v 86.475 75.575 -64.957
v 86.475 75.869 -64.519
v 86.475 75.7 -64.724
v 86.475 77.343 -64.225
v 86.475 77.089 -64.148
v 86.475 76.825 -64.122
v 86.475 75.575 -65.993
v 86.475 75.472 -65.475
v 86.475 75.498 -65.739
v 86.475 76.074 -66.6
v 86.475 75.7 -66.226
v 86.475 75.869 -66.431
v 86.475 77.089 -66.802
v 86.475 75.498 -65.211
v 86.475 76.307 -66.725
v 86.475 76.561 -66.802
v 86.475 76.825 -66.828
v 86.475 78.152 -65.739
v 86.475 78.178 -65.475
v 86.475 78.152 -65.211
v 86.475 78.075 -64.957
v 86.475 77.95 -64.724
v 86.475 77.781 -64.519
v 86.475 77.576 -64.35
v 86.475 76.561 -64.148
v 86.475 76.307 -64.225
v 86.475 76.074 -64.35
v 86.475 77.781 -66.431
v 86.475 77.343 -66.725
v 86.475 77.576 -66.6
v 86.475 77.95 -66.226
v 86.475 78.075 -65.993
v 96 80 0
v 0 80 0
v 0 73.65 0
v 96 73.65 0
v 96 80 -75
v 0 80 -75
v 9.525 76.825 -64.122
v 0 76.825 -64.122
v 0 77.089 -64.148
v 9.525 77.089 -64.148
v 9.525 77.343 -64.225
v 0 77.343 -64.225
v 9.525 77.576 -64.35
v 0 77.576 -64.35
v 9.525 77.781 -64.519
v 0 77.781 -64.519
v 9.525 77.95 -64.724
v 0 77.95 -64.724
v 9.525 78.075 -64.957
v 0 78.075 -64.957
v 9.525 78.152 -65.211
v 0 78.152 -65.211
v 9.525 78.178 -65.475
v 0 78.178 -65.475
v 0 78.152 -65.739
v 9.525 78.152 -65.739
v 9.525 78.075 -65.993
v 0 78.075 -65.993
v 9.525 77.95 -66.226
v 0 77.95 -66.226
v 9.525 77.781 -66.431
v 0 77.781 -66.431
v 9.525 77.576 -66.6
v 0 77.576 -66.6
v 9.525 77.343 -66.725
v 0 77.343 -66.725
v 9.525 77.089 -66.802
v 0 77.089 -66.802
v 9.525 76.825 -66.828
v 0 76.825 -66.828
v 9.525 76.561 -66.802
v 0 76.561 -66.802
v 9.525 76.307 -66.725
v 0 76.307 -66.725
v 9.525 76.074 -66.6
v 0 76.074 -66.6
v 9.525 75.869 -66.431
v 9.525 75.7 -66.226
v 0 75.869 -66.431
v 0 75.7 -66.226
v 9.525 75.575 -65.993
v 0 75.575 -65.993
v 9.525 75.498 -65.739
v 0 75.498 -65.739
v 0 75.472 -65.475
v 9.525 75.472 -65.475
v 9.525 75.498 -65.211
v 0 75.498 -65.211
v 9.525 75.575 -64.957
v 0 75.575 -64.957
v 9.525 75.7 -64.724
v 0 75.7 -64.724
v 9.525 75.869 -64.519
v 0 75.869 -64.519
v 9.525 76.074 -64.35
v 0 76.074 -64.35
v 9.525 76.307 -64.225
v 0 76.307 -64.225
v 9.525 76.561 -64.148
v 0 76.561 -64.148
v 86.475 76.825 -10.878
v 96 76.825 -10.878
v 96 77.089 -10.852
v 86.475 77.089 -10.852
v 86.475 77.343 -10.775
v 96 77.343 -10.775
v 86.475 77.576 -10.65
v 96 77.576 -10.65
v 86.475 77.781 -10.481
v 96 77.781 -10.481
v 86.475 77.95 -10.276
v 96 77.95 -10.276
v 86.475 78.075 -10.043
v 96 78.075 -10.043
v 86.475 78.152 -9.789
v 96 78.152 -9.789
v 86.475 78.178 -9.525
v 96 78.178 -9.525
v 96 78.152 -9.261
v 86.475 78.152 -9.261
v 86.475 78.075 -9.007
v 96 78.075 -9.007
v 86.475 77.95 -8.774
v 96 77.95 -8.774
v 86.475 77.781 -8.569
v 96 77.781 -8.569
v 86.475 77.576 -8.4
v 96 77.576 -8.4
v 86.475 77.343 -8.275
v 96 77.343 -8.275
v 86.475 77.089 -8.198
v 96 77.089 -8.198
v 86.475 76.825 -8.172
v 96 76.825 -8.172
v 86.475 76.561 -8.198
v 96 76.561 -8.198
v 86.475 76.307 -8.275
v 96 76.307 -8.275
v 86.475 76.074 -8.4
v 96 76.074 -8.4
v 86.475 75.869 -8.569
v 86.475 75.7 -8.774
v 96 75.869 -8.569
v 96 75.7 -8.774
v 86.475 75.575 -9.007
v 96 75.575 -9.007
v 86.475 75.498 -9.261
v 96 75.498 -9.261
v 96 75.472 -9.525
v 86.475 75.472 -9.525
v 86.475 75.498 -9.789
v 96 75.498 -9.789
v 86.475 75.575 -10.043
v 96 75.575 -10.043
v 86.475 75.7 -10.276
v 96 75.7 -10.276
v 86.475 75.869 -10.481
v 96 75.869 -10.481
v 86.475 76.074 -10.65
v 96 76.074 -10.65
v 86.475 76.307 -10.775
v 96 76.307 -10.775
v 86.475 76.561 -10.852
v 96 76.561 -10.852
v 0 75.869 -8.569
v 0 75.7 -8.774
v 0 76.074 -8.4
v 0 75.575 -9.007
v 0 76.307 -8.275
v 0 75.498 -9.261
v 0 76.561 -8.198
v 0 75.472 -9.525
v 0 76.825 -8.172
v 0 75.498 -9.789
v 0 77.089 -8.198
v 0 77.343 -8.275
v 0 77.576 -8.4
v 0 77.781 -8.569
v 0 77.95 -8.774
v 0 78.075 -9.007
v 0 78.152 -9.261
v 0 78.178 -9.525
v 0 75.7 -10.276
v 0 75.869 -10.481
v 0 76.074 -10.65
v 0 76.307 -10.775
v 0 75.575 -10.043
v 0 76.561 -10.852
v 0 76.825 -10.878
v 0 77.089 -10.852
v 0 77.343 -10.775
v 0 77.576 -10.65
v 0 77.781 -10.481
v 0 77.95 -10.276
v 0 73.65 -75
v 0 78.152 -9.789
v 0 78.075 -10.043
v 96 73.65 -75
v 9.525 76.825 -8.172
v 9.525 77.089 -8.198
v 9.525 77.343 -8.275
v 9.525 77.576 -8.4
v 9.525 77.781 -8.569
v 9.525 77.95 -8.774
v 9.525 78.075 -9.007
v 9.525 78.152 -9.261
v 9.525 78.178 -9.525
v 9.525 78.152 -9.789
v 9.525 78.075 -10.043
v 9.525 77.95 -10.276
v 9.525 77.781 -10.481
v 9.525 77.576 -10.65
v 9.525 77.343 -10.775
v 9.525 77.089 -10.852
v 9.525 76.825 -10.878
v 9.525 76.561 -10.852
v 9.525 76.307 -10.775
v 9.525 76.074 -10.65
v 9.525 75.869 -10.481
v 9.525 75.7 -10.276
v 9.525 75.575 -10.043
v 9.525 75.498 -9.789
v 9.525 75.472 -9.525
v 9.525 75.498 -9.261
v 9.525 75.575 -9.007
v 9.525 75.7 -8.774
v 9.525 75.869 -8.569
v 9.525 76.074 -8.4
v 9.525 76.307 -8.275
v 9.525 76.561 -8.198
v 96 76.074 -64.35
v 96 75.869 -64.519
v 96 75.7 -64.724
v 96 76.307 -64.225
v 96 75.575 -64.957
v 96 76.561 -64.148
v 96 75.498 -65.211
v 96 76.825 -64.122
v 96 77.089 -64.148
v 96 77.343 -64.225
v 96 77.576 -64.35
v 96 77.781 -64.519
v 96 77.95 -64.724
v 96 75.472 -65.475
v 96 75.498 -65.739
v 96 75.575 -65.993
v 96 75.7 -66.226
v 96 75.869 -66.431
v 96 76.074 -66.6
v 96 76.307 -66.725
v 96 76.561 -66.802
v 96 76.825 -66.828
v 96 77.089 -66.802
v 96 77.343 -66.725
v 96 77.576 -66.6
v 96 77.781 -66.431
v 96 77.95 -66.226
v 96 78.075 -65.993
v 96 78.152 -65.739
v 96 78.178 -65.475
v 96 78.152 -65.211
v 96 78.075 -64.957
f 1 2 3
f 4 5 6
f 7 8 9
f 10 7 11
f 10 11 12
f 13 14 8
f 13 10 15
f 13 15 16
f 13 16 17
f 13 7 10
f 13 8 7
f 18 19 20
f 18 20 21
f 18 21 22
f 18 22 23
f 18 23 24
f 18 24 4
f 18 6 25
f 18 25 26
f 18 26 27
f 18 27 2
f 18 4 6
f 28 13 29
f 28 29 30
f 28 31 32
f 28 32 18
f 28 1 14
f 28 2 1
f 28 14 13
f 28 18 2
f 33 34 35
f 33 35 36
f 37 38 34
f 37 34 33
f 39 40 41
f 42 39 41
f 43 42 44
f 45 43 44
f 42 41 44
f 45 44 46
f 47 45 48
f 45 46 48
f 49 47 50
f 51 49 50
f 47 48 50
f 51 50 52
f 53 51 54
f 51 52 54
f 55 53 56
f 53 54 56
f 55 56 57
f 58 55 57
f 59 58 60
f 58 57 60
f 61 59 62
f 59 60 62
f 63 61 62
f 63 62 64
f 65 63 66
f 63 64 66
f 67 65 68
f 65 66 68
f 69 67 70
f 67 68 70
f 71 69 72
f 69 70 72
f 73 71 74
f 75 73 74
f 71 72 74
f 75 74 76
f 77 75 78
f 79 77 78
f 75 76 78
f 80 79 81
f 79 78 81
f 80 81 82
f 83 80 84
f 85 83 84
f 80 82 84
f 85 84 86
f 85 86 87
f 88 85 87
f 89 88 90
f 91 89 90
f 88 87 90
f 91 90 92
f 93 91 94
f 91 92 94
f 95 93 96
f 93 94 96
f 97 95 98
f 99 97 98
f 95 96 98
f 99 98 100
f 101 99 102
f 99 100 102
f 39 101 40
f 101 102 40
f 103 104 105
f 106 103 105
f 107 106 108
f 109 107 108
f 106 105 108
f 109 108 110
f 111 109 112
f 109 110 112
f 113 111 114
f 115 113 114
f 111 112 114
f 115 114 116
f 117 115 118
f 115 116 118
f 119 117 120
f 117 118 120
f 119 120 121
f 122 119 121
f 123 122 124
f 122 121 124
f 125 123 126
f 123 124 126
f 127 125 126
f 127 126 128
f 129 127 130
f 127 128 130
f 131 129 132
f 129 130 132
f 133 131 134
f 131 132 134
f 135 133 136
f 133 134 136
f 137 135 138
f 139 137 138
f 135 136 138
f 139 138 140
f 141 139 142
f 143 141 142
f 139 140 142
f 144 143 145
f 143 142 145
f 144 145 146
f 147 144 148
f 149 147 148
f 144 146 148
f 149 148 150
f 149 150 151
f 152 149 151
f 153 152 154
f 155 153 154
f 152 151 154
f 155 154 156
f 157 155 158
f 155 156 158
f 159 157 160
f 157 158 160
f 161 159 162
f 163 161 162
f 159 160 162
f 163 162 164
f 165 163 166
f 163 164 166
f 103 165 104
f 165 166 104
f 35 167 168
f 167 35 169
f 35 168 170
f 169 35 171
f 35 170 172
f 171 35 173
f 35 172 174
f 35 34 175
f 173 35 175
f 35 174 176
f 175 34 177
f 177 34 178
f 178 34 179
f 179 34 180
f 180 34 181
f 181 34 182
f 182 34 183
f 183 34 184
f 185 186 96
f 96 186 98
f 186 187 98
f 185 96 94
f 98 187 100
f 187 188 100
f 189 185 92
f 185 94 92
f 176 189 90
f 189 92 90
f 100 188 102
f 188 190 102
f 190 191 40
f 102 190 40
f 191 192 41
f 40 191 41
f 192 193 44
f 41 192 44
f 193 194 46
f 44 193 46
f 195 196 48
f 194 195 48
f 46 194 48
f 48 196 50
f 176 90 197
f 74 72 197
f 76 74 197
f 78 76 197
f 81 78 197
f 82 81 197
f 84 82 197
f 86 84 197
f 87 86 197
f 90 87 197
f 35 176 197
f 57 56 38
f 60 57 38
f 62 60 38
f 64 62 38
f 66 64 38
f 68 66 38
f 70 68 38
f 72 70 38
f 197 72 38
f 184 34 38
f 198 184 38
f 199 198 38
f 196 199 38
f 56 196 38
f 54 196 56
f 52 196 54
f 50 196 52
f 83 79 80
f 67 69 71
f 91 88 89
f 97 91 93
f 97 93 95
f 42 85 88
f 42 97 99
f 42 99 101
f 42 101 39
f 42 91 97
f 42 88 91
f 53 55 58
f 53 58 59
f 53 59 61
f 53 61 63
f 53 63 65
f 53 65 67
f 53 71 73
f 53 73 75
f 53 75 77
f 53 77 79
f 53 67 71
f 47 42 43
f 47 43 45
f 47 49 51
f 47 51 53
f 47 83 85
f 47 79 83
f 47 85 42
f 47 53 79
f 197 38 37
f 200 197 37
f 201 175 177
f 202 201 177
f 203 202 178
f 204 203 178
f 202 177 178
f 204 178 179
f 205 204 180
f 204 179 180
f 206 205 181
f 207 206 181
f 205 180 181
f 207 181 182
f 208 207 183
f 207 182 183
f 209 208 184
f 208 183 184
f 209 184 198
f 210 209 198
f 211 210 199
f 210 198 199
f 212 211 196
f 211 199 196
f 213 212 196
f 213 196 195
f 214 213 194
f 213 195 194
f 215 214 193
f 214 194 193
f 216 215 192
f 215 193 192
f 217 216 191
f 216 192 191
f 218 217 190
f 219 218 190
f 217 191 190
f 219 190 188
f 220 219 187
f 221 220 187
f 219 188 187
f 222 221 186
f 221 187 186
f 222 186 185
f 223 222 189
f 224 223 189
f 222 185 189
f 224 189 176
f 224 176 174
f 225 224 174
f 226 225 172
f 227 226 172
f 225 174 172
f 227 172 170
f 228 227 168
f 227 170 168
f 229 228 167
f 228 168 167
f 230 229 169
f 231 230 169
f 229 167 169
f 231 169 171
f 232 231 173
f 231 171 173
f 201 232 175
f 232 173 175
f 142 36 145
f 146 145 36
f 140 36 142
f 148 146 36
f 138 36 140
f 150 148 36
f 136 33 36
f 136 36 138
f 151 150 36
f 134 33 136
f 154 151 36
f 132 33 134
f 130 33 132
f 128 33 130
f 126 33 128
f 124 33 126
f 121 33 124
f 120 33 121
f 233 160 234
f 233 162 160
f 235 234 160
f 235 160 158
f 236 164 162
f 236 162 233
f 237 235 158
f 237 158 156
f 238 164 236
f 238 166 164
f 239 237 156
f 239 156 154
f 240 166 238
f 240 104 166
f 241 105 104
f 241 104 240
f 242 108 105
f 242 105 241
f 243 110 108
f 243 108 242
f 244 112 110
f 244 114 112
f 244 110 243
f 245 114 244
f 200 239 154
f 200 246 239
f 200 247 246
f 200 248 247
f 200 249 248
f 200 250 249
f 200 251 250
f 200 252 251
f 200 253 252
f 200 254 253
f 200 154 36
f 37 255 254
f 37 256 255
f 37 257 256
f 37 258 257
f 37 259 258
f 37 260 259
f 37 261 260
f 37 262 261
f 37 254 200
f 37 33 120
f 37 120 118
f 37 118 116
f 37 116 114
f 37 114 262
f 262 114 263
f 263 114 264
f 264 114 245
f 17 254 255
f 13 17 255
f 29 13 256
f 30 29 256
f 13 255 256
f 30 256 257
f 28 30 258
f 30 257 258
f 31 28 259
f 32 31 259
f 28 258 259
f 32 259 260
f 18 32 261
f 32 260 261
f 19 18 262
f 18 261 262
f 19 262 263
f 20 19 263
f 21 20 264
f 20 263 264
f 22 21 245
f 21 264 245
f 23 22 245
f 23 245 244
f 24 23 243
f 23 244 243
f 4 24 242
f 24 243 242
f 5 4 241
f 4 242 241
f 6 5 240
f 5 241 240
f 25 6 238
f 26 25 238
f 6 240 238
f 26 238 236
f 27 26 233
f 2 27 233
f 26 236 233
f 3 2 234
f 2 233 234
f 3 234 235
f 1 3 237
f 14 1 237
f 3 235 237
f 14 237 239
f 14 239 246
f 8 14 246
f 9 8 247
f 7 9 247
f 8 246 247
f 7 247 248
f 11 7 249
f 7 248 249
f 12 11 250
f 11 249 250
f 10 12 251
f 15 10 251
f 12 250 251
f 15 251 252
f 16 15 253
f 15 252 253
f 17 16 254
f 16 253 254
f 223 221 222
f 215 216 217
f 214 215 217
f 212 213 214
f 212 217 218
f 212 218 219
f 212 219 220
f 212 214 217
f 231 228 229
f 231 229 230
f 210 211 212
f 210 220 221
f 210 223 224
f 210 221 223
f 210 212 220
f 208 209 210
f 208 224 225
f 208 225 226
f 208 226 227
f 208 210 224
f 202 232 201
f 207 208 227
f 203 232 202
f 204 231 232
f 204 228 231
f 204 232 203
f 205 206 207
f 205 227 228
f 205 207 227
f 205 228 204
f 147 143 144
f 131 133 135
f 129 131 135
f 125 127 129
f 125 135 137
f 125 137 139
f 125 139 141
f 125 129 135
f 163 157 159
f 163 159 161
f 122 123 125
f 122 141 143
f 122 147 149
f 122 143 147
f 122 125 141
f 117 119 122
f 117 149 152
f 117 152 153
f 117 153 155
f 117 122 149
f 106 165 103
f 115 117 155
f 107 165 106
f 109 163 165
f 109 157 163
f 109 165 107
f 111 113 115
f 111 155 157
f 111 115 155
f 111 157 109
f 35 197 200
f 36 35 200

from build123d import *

# Parameters (mm, degrees)
SKETCH1_W           = 96
SKETCH1_H           = 75
BOSS_EXTRUDE1_DEPTH = 6.35
SKETCH2_R           = 1.35255
CUT_EXTRUDE1_DEPTH  = 9.525
SKETCH3_R           = 1.35255
CUT_EXTRUDE2_DEPTH  = 9.525


with BuildPart() as part:
    # Sketch1 → Boss-Extrude1 (new body)
    with BuildSketch(Plane(origin=(0, 80, 0), x_dir=(1, 0, 0), z_dir=(0, 1, 0))):
        with Locations((48, 37.5)):
            Rectangle(SKETCH1_W, SKETCH1_H)
    extrude(amount=-BOSS_EXTRUDE1_DEPTH)

    # Sketch2 → Cut-Extrude1 (cut)
    with BuildSketch(Plane(origin=(96, 0, 0), x_dir=(0, 0, -1), z_dir=(1, 0, 0))):
        with Locations((65.475, 76.825)):
            Circle(SKETCH2_R)
        with Locations((9.525, 76.825)):
            Circle(SKETCH2_R)
    extrude(amount=-CUT_EXTRUDE1_DEPTH, mode=Mode.SUBTRACT)

    # Sketch3 → Cut-Extrude2 (cut)
    with BuildSketch(Plane.ZY):
        with Locations((-65.475, 76.825)):
            Circle(SKETCH3_R)
        with Locations((-9.525, 76.825)):
            Circle(SKETCH3_R)
    extrude(amount=-CUT_EXTRUDE2_DEPTH, mode=Mode.SUBTRACT)


solid = part.part
